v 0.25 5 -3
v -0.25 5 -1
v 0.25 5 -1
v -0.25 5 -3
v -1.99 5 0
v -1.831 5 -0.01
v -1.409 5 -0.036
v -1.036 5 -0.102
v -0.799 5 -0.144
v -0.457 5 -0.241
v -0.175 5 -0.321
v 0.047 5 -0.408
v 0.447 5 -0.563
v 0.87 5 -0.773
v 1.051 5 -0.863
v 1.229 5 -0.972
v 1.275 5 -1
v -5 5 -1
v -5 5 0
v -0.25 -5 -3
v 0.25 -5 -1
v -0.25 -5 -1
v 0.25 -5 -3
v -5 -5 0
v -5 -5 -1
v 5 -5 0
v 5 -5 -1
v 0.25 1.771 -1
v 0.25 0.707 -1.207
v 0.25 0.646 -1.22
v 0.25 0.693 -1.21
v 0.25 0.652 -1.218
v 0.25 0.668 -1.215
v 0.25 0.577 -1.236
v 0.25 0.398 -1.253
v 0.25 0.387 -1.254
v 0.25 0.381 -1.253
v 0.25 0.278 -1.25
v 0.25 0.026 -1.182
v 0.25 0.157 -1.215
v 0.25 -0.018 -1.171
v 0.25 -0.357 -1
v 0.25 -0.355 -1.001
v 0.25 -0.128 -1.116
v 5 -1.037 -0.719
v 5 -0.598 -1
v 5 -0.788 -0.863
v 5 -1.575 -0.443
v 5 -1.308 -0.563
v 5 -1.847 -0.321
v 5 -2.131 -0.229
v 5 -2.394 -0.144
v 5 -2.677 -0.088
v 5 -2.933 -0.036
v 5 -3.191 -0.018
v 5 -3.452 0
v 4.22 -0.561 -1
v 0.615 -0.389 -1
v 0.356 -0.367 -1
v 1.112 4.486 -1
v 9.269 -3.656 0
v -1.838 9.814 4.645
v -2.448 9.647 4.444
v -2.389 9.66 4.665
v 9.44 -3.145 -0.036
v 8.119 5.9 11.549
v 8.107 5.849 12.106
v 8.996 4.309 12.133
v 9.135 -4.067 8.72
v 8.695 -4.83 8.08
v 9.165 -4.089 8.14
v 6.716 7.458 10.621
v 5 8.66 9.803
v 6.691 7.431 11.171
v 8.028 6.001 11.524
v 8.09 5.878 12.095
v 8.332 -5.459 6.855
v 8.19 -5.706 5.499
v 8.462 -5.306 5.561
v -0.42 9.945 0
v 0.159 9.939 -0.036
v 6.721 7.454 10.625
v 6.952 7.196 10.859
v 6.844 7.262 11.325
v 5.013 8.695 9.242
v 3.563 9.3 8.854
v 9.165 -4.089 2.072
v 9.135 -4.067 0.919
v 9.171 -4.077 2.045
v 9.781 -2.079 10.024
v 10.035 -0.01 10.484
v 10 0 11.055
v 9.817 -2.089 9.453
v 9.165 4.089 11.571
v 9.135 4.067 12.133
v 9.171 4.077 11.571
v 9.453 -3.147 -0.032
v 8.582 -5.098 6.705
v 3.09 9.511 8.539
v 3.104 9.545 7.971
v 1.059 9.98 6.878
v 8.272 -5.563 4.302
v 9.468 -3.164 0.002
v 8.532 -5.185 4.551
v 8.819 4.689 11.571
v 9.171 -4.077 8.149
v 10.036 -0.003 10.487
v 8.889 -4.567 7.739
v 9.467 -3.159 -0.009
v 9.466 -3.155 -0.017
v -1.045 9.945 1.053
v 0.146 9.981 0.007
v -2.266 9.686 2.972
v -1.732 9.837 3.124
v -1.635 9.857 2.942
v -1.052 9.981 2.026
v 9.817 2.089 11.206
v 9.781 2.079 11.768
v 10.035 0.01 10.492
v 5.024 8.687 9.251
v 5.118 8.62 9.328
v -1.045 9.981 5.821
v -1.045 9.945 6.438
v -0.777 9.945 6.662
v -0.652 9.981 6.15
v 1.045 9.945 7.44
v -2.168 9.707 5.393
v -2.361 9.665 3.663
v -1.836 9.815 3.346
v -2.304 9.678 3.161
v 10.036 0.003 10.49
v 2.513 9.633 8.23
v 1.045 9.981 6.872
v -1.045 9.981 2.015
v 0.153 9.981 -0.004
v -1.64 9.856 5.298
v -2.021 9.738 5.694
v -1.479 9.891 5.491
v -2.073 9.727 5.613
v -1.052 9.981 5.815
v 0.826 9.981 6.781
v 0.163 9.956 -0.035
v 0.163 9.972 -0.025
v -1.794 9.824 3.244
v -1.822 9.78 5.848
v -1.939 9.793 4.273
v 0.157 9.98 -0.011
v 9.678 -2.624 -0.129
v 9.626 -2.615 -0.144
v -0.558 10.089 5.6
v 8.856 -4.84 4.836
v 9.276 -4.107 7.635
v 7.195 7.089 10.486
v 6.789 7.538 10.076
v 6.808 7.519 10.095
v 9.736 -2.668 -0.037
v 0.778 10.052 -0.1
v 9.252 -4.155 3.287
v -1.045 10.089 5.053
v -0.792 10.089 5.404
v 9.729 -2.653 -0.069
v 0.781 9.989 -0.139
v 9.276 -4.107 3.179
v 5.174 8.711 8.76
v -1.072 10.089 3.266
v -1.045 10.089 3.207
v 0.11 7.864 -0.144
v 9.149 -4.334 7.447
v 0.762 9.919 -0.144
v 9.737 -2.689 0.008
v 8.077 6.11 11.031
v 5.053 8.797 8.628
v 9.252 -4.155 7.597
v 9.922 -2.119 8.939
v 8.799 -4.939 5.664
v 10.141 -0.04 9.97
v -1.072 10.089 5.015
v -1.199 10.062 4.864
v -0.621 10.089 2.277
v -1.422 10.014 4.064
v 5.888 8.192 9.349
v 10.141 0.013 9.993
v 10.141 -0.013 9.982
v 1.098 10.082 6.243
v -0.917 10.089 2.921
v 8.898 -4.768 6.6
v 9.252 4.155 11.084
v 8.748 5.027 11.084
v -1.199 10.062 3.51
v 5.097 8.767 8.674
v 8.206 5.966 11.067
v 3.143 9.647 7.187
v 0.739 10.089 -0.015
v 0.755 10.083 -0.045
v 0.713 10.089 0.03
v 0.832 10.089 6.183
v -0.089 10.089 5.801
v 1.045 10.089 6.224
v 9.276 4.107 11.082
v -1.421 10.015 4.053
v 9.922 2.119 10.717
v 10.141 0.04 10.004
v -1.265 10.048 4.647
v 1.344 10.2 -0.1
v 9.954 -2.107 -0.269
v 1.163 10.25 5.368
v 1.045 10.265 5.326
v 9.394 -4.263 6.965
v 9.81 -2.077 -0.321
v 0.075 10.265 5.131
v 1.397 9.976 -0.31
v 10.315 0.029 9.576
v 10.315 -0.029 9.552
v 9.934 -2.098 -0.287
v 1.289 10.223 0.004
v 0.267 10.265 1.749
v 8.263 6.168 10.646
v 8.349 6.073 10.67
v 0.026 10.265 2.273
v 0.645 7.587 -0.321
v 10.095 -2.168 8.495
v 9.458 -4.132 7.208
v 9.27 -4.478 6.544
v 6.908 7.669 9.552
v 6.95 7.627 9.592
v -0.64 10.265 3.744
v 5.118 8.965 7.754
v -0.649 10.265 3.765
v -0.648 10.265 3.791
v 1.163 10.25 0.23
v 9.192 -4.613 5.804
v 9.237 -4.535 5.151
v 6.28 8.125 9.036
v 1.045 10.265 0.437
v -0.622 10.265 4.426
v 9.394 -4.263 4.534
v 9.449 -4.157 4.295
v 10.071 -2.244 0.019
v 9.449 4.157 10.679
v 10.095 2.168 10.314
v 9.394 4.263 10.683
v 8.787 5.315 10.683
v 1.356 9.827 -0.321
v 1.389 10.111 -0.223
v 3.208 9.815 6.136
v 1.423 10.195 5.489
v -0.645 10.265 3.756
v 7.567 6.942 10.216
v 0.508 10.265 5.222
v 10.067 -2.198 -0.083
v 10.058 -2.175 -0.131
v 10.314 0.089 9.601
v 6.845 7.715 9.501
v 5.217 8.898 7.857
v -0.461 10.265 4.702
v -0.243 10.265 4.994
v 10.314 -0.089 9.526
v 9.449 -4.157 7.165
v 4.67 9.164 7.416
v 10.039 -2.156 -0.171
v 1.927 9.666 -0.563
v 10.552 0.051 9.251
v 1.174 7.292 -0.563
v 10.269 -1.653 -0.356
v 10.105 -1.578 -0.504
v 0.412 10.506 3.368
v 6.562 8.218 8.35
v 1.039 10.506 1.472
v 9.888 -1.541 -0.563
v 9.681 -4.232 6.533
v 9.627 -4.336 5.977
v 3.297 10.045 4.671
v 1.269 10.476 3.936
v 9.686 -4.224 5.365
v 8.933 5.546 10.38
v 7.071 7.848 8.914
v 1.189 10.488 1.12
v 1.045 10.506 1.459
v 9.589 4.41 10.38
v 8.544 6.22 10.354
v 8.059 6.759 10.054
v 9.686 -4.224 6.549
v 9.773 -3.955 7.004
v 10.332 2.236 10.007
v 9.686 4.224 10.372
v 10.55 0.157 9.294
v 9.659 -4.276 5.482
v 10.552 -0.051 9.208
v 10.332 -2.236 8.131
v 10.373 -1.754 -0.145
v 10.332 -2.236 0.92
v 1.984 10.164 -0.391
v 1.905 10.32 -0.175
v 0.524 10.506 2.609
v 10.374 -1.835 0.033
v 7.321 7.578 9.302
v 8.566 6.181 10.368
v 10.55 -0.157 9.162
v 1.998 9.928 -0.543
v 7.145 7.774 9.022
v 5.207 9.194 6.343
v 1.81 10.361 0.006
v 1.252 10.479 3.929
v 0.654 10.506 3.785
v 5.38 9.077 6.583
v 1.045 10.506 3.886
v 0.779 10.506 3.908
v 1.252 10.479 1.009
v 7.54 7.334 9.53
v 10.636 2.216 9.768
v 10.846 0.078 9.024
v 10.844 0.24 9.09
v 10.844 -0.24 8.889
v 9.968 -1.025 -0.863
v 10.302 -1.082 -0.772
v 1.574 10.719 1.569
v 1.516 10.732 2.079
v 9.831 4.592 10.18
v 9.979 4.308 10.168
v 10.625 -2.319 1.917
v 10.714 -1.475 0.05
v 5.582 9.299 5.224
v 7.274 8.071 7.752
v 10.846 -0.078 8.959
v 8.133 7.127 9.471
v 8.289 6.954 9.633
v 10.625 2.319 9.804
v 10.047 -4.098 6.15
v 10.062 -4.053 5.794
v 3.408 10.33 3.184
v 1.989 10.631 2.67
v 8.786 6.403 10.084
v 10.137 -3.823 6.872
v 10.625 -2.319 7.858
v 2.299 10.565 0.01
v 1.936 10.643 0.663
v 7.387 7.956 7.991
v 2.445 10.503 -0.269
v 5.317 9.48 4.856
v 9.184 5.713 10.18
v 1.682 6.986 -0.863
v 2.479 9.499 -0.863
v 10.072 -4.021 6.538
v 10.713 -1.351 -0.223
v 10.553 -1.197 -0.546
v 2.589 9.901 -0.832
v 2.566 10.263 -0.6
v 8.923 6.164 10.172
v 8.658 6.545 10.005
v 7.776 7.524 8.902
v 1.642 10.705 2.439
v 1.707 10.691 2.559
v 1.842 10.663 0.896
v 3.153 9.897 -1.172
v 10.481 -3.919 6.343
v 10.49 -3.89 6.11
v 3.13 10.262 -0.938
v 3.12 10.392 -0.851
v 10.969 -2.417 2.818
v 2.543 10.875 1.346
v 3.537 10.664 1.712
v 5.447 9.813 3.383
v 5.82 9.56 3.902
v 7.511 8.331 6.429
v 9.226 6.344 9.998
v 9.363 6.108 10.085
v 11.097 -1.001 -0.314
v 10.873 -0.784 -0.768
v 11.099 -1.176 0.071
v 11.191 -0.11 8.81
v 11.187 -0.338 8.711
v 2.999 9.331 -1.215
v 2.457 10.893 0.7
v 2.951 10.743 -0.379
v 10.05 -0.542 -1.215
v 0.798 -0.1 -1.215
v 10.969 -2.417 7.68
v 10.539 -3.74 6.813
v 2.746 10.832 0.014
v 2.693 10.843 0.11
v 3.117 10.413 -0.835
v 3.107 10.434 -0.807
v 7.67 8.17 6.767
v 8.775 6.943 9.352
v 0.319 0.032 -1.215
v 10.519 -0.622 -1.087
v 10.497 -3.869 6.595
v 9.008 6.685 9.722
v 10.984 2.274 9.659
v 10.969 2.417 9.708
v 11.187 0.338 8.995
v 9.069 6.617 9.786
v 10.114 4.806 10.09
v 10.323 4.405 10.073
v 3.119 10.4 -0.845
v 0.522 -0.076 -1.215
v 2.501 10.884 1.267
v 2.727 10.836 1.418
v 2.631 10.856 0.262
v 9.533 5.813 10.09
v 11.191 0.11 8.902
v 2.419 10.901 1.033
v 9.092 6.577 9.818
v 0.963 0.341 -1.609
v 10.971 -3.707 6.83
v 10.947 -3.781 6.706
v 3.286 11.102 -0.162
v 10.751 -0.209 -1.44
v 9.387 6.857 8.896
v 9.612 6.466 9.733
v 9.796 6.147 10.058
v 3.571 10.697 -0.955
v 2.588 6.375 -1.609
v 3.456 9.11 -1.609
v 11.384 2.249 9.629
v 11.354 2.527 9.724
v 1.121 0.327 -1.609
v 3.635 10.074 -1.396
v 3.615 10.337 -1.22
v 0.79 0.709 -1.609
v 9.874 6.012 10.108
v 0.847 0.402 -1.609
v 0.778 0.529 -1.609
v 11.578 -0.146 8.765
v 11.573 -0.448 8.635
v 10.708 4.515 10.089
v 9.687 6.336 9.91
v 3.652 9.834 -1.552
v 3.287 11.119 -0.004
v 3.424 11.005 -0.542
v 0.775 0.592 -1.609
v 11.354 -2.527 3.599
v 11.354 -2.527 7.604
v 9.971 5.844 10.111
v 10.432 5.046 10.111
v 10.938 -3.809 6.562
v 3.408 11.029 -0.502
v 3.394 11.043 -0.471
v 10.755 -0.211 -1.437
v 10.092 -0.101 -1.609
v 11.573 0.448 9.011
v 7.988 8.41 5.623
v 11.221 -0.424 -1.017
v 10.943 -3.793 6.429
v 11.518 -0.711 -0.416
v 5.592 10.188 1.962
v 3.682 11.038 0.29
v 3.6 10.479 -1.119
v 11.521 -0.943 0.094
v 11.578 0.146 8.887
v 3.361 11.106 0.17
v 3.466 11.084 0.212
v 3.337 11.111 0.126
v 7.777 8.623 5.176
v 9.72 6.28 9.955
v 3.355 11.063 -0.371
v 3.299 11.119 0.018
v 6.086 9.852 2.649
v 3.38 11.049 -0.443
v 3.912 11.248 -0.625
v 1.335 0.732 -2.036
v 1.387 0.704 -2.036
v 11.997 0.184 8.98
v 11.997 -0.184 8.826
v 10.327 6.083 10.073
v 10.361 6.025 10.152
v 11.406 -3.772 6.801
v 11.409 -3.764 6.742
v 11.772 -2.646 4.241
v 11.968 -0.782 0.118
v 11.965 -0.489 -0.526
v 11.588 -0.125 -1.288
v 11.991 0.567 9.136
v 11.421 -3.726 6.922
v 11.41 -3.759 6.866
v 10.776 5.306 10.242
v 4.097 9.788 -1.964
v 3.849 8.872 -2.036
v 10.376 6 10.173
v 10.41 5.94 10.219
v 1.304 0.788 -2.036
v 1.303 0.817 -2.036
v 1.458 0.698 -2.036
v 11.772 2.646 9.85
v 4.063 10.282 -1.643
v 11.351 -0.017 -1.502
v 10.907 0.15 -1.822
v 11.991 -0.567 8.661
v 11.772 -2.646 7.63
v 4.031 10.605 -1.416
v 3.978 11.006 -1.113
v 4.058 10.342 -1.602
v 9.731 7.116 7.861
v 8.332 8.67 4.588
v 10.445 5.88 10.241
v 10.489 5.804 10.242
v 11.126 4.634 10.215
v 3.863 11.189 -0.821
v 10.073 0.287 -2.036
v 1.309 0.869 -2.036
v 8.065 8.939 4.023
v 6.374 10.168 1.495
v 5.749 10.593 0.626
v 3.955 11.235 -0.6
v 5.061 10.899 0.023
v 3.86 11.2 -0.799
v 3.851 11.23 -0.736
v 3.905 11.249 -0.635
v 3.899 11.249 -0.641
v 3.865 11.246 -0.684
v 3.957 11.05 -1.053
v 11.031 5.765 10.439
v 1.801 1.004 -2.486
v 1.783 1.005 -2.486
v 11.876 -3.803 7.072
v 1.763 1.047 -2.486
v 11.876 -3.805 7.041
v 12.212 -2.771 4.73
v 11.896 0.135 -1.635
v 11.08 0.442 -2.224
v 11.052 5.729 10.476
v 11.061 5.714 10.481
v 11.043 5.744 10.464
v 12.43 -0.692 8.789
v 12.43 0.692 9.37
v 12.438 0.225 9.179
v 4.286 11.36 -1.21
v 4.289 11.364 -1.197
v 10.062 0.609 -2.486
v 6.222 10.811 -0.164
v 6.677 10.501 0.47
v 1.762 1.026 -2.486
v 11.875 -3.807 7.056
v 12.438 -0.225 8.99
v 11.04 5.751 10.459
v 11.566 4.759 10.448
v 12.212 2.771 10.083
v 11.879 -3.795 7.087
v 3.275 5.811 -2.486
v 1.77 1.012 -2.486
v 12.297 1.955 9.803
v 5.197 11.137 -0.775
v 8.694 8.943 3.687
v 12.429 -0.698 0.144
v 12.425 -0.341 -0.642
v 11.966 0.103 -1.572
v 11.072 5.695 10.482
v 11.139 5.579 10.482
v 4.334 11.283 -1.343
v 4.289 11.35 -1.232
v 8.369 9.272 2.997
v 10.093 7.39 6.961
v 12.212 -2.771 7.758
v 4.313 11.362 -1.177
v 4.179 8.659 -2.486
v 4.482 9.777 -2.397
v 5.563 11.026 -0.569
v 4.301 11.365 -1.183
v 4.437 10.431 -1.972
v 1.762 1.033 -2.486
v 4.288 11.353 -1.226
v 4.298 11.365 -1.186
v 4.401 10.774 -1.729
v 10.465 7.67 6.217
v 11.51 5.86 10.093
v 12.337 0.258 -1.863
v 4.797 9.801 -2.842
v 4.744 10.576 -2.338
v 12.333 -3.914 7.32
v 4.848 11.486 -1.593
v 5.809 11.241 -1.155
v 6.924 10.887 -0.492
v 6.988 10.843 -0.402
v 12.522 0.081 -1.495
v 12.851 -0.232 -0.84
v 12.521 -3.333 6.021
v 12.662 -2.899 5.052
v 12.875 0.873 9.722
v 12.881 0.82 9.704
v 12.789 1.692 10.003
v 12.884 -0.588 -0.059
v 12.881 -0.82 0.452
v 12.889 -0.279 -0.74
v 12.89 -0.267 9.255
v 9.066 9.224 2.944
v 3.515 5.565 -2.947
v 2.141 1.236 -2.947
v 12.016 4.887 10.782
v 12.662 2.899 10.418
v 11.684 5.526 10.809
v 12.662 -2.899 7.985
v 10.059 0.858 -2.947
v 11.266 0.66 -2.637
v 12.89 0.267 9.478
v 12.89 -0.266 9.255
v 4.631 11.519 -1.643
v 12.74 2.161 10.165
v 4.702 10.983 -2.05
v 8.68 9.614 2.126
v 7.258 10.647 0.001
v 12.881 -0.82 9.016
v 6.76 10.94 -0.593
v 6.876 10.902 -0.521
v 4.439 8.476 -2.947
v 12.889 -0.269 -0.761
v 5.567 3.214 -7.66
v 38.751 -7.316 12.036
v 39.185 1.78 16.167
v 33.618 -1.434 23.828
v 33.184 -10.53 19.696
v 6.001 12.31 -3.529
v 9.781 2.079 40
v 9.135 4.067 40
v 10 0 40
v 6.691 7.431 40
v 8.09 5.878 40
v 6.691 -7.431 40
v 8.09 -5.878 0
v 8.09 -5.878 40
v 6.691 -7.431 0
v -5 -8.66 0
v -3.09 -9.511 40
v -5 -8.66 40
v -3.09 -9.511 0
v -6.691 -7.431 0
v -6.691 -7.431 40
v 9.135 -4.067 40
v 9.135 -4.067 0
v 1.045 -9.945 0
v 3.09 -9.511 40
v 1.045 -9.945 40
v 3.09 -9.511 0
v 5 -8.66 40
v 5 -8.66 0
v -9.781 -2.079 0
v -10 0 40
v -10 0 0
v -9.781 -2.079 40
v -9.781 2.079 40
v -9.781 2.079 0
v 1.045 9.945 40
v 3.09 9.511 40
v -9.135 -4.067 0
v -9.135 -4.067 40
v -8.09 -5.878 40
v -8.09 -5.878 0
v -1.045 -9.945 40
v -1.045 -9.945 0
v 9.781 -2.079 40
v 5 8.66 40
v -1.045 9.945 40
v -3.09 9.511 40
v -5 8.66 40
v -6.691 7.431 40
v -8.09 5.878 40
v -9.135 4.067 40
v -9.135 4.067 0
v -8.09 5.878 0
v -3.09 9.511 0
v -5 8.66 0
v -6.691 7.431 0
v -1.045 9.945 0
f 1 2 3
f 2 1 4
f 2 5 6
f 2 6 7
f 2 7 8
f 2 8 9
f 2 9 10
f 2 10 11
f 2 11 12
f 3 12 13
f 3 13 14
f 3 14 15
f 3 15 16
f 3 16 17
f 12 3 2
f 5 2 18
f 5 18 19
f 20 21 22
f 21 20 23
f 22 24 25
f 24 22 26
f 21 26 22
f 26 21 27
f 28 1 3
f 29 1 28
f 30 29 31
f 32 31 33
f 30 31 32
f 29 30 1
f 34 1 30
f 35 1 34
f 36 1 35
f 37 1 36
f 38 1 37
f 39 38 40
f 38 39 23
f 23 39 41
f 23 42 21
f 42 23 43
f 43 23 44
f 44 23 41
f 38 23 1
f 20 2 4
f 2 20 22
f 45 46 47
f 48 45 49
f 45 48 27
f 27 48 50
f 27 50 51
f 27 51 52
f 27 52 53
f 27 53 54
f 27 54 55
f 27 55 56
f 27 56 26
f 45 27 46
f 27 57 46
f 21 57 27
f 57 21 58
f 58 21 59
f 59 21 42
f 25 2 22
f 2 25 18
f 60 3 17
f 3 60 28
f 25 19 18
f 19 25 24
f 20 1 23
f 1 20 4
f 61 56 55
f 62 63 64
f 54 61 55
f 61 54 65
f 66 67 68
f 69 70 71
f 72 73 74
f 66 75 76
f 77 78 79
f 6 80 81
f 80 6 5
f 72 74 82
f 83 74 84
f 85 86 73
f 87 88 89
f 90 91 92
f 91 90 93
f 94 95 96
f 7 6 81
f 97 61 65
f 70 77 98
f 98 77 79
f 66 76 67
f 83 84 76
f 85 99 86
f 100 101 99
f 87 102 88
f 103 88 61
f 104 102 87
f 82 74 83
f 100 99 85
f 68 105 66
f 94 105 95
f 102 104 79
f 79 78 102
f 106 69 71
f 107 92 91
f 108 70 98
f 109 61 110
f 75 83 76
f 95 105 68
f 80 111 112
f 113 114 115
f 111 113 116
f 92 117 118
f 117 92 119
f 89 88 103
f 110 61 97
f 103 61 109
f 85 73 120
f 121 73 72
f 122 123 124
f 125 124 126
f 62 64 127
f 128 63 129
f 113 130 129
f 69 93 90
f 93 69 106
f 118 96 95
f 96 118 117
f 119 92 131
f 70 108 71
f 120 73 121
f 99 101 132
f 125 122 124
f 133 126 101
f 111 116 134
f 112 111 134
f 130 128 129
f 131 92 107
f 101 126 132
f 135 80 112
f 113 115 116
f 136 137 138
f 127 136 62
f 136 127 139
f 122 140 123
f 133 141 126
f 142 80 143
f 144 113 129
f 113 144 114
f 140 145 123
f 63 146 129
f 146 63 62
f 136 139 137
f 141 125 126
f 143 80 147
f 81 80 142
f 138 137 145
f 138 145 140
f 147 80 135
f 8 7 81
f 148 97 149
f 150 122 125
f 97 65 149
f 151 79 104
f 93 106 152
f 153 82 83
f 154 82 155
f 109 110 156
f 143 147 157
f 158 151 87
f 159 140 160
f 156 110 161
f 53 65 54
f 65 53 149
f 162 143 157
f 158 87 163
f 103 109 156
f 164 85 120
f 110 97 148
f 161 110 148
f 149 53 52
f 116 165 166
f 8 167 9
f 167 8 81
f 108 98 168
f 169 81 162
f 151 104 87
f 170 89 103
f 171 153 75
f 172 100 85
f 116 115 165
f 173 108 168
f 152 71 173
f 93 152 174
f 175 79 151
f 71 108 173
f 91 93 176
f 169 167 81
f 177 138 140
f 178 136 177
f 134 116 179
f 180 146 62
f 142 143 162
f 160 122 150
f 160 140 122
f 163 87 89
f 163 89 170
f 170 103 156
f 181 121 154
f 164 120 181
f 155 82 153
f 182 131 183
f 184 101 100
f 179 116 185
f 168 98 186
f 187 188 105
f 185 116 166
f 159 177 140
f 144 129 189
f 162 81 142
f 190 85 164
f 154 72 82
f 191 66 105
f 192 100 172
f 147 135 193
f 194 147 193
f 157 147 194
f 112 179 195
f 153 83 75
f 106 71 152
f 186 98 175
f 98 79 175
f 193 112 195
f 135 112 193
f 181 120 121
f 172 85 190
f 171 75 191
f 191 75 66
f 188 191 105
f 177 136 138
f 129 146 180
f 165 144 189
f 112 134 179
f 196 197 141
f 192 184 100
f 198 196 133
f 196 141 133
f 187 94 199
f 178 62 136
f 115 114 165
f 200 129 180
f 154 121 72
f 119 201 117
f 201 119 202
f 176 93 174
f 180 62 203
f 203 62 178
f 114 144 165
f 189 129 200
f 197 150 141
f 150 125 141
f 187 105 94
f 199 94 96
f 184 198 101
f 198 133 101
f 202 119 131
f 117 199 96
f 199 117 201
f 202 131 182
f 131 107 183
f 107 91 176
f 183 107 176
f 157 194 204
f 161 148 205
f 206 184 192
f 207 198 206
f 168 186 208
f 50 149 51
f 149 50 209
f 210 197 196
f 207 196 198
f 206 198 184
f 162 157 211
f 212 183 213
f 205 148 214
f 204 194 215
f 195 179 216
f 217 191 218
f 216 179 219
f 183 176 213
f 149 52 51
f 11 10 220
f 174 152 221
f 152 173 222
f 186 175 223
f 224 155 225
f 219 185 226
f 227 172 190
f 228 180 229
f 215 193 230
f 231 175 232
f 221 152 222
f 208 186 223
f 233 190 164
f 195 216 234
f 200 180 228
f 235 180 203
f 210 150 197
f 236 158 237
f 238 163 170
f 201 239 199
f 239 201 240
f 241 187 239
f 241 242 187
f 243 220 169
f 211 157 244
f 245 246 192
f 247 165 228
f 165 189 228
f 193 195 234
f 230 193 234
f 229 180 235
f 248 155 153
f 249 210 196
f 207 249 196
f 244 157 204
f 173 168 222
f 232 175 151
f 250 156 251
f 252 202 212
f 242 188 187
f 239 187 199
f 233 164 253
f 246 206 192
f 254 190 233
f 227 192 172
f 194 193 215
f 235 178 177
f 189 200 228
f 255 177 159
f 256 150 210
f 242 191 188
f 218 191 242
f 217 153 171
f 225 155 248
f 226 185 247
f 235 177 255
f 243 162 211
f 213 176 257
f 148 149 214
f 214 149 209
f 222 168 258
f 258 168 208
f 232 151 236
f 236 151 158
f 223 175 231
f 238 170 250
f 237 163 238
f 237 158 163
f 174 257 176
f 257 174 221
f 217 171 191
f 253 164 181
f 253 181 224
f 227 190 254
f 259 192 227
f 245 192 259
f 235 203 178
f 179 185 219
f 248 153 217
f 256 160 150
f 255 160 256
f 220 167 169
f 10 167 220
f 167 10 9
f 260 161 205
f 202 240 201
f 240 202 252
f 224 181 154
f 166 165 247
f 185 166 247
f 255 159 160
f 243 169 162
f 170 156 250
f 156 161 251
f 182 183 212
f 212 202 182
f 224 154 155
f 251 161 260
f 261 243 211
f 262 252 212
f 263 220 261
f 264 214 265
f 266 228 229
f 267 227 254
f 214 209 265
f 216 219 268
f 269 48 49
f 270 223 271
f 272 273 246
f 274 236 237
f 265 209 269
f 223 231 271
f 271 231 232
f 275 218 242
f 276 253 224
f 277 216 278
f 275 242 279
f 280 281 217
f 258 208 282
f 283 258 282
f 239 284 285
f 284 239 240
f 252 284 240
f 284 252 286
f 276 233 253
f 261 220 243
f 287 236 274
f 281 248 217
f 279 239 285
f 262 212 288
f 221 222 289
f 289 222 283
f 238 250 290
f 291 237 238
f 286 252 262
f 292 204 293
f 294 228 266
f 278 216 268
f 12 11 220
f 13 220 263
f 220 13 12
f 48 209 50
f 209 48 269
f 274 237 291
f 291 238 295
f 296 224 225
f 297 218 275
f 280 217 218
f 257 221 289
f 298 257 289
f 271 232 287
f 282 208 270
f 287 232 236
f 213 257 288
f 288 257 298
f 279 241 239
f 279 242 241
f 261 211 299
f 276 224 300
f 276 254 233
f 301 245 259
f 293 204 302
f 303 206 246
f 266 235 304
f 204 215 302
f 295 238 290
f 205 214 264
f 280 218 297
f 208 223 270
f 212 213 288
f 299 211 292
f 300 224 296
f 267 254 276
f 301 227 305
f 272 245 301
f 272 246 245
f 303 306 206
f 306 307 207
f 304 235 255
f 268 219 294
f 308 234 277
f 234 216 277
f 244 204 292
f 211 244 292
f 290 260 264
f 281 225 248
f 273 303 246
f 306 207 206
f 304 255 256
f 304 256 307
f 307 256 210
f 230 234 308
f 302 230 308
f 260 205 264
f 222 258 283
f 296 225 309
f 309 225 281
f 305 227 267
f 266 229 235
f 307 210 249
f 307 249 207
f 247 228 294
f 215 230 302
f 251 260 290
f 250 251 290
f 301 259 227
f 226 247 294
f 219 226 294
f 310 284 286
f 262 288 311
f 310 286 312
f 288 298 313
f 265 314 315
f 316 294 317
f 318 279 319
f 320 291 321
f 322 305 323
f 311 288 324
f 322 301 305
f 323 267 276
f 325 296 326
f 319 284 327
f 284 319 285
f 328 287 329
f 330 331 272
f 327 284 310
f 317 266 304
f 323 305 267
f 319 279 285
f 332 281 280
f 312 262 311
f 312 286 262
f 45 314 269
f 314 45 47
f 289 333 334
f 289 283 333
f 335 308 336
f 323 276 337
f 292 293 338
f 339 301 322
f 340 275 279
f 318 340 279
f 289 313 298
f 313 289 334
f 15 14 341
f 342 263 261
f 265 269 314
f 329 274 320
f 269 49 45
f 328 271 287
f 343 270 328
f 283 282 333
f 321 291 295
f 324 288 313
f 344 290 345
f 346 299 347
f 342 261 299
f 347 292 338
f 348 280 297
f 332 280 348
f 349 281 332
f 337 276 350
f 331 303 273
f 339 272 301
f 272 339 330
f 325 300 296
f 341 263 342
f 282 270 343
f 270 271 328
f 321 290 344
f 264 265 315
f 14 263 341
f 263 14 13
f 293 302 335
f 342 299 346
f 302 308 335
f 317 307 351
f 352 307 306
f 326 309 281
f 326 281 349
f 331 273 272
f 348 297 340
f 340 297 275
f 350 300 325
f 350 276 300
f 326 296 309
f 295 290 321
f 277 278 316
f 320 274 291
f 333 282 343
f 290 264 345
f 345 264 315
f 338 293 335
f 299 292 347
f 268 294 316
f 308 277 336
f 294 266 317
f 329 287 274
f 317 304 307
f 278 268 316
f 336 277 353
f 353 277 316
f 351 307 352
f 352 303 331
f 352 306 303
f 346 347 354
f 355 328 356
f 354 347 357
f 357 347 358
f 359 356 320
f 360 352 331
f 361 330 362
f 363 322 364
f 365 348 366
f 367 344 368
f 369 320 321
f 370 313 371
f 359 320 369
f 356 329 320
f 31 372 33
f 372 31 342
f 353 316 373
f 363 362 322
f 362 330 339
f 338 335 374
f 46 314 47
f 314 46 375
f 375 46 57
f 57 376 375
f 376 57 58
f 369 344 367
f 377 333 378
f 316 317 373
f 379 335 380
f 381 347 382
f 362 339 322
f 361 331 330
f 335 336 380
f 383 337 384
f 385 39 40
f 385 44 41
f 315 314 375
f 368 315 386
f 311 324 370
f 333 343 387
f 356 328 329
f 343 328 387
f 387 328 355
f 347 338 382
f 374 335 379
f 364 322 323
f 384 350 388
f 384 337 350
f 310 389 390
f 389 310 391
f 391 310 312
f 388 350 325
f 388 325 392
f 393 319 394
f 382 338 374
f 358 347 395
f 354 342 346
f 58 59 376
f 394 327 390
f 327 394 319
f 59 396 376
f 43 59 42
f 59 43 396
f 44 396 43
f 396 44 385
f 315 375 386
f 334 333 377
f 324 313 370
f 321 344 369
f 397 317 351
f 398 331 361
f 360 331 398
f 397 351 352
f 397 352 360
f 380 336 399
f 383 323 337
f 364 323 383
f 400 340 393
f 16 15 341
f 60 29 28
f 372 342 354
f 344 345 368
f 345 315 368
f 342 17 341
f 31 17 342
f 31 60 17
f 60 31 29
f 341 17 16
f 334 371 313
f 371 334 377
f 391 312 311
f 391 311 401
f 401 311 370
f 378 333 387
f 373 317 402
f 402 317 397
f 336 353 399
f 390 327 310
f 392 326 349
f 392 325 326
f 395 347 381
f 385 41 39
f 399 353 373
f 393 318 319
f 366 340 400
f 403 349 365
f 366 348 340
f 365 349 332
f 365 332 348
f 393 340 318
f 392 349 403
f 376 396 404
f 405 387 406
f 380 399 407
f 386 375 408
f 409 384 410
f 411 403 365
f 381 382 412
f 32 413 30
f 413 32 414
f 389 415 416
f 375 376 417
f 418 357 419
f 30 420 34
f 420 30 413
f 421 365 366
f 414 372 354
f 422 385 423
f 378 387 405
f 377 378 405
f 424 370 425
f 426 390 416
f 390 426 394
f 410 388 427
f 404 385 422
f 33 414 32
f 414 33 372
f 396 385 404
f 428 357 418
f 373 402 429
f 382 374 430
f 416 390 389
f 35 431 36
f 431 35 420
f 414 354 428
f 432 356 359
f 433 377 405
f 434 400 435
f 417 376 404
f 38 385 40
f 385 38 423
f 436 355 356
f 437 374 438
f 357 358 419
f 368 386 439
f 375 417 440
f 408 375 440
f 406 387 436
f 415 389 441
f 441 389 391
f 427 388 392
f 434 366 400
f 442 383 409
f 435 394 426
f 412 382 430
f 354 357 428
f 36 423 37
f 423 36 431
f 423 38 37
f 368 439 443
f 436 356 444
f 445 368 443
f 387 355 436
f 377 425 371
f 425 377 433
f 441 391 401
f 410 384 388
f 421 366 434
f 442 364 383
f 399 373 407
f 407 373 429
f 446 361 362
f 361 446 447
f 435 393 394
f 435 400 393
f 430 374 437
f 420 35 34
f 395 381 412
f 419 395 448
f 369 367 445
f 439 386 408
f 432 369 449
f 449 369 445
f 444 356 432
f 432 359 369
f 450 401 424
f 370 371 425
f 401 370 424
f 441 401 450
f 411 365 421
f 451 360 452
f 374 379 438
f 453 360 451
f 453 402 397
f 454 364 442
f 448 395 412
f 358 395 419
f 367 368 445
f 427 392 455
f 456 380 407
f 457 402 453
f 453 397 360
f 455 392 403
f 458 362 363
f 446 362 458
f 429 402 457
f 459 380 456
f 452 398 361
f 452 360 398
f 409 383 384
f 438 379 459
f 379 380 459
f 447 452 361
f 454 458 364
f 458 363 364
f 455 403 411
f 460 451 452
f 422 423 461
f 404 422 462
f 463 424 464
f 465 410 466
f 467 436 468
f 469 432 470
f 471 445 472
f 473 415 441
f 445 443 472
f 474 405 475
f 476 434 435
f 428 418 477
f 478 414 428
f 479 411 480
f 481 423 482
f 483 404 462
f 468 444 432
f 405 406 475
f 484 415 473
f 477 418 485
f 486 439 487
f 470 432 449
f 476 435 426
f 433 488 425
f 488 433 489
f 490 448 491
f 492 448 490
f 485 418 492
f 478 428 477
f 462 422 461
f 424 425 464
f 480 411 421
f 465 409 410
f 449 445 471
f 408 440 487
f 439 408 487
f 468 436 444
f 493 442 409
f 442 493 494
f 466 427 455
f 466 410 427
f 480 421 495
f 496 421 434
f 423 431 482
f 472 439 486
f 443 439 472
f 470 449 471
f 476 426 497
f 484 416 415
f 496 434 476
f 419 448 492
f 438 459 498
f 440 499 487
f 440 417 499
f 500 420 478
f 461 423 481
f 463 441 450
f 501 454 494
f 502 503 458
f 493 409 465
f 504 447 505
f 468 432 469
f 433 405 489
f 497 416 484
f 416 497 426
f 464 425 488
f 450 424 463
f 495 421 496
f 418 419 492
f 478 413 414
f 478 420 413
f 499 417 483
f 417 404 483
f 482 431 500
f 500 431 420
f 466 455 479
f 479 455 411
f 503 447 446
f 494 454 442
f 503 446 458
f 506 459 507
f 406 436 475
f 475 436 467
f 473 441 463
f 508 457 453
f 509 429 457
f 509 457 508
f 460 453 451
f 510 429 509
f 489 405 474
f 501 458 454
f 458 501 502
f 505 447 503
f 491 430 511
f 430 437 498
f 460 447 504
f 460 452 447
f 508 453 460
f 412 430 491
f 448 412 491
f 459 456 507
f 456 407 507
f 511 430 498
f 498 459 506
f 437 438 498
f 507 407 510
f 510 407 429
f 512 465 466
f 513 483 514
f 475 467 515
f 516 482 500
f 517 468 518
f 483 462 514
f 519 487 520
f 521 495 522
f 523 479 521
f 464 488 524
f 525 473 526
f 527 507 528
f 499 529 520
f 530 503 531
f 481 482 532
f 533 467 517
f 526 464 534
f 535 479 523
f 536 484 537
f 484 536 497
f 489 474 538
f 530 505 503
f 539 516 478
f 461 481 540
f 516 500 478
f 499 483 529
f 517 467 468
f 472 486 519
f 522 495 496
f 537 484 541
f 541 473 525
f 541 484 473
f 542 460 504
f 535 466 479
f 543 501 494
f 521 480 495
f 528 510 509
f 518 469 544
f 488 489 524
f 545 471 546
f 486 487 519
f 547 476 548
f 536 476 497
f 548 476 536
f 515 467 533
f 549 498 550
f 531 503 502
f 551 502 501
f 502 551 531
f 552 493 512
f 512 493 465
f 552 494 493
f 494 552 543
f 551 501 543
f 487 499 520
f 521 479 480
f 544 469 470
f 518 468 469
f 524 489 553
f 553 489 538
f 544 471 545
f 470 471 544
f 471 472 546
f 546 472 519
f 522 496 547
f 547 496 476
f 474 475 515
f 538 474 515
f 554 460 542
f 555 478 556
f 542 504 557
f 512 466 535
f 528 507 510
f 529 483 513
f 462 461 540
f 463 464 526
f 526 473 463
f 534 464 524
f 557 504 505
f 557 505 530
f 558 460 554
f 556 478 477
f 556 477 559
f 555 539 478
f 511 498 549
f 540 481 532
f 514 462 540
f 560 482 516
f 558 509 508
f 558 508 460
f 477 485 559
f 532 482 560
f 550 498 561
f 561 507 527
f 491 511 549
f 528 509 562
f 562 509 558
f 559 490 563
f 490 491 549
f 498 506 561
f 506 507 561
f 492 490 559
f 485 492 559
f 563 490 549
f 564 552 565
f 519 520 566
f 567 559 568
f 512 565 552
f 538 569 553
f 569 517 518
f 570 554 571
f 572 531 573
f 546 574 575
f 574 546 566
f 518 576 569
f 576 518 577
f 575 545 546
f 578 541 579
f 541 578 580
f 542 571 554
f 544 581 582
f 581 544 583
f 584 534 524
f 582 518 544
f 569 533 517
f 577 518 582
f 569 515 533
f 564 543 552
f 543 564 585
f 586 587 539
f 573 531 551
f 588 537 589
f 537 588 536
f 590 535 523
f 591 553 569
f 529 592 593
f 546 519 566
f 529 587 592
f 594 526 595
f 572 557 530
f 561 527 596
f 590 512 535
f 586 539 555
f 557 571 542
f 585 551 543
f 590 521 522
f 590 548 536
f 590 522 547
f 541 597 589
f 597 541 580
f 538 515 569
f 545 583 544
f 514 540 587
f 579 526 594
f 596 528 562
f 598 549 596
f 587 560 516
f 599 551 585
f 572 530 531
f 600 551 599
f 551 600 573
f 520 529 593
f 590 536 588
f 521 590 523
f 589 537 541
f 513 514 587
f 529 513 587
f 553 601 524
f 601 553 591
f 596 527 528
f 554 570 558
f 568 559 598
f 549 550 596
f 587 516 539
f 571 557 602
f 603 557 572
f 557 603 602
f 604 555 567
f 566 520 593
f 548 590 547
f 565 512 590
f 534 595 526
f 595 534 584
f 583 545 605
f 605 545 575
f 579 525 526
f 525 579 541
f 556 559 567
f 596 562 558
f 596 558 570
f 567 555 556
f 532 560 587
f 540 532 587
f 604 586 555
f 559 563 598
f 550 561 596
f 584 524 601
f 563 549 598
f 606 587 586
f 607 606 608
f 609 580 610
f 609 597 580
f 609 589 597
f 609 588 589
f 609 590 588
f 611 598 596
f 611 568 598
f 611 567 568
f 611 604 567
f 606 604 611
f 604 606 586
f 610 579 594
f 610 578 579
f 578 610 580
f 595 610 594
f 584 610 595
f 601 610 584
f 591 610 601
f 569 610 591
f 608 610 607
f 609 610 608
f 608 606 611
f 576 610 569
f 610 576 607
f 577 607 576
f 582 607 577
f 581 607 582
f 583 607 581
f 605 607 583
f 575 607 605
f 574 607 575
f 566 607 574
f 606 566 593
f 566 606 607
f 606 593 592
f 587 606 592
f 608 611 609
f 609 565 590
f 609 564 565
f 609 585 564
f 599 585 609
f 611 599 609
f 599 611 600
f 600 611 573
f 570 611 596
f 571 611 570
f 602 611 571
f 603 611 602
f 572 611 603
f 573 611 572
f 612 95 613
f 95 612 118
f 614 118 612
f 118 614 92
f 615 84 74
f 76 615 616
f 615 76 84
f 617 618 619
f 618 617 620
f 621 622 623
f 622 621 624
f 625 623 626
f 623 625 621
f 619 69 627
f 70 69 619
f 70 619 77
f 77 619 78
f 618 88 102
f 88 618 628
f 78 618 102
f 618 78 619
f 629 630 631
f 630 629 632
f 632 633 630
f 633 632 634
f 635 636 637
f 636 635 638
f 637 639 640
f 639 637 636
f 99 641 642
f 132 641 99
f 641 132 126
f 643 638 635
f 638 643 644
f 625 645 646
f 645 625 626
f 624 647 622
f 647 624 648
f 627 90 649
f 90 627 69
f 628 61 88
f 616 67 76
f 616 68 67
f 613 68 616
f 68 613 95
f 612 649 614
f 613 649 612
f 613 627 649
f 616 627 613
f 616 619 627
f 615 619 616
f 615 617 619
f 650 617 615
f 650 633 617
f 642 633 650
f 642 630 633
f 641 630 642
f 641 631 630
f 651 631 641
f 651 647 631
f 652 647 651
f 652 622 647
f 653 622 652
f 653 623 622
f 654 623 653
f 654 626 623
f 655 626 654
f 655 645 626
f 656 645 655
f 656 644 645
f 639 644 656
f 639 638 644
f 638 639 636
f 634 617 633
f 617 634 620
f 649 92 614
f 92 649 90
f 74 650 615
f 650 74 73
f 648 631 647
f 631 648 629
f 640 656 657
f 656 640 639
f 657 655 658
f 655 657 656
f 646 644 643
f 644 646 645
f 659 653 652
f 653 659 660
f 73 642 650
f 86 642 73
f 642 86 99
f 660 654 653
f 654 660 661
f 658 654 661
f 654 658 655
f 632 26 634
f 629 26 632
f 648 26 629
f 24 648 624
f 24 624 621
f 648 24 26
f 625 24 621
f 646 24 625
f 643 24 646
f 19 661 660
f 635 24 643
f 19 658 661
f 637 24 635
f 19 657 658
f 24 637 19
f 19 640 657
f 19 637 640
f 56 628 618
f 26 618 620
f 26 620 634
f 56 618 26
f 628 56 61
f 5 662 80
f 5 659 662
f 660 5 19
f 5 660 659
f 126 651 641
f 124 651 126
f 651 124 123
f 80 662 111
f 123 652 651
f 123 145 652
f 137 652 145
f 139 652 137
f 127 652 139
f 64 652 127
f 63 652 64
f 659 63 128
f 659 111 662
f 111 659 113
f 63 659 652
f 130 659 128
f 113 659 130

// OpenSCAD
// file: unionRoundMask.scad
    ////////////////////////////////////////////////////////
    /*
    unionRound() 1.0 Module by Torleif Ceder - TLC123 late summer 2021
     Pretty fast Union with radius, But limited to a subset of cases
    Usage 
     unionRound( radius , detail  )
        {
         YourObject1();
         YourObject2(); 
        } 
      unionRoundMask (r, detail , epsilon ,showMask )
        {
         YourObject1();
         YourObject2(); 
         YourMask();
         YourMask();  // multimask not implemented
         
         // ...
         // ...
         // ...
         
        } 
    limitations: 
     0. Only really fast when boolean operands are convex, 
            Minkowski is fast in that case. 
     1. Boolean operands may be concave but can only touch 
            in a single convex area
     2. Radius is of elliptic type and is only approximate r
            were operand intersect at perpendicular angle. 
    */
    //////////////////////////////////////////////////////// 
    // Demo code
    demo= true;
    if (demo)  
     unionRoundMask(1.5, 5) {
     cube([10,10,2],true);
     rotate([20,-10,0])cylinder(5,1,1,$fn=12);   
     cube([.5,10,6],center=true); //mask
    }
    
    // end of demo code
    //
    // todo multi-mask iteraation
      module unionRoundMask(r, detail = 5,  epsilon = 1e-6,showMask=true) {
            children(0);
            children(1);
            if(showMask)#children(2);
          intersection(){
                 children(2);
                 unionRound(r, detail,  epsilon ) {
                    intersection(){
                        children(0);
                        children(2); // mask
                       }
                    intersection(){
                        children(1);
                        children(2);// mask
                       }  
              }
          }
       }
    
    
    
    module unionRound(r, detail = 5,  epsilon = 1e-6) {
        
        children(0);
        children(1);
        step = 90 / detail;
      for (i = [0:  detail-1]) {
            {
                x = r - sin(i * step ) * r;
                y = r - cos(i * step ) * r;
                xi = r - sin((i * step + step)  ) * r;
                yi = r - cos((i * step + step)  ) * r;
                color(rands(0, 1, 3, i))
                hull() {
                    intersection() {
                        // shell(epsilon) 
                        clad(x) children(0);
                        // shell(epsilon) 
                        clad(y) children(1);
                    }
                    intersection() {
                        // shell(epsilon) 
                        clad(xi) children(0);
                        // shell(epsilon) 
                        clad(yi) children(1);
                    }
                }
            }
        }
    }
    // unionRound helper expand by r
    module clad(r) {
        minkowski() {
            children();
            //        icosphere(r,2);
             isosphere(r,70); 
        }
    }
    // unionRound helper
    module shell(r) {
        difference() {
            clad(r) children();
            children();
        }
    }
    /*    
    // The following is a sphere with some equidistant properties.
    // Not strictly necessary

    Kogan, Jonathan (2017) "A New Computationally Efficient Method for Spacing n Points on a Sphere," Rose-Hulman Undergraduate Mathematics Journal: Vol. 18 : Iss. 2 , Article 5.
    Available at: https://scholar.rose-hulman.edu/rhumj/vol18/iss2/5 */
    
    function sphericalcoordinate(x,y)=  [cos(x  )*cos(y  ), sin(x  )*cos(y  ), sin(y  )];
    function NX(n,x)= 
    let(toDeg=57.2958,PI=acos(-1)/toDeg,
    start=(-1.+1./(n-1.)),increment=(2.-2./(n-1.))/(n-1.) )
    [ for (j= [0:n-1])let (s=start+j*increment )
    sphericalcoordinate(   s*x*toDeg,  PI/2.* sign(s)*(1.-sqrt(1.-abs(s)))*toDeg)];
    function generatepoints(n)= NX(n,0.1+1.2*n);
    module isosphere(r,detail){
    a= generatepoints(detail);
    scale(r)hull()polyhedron(a,[[for(i=[0:len(a)-1])i]]);
    }
// main file
include<unionRoundMask.scad>


color("green")
render()
unionRoundMask(r=3,detail=10,q=12,showMask=false)
{
    rotate([40,50,30])
    linear_extrude(40 )square([10,10]);
    linear_extrude(40 )circle(10);
    
    }
